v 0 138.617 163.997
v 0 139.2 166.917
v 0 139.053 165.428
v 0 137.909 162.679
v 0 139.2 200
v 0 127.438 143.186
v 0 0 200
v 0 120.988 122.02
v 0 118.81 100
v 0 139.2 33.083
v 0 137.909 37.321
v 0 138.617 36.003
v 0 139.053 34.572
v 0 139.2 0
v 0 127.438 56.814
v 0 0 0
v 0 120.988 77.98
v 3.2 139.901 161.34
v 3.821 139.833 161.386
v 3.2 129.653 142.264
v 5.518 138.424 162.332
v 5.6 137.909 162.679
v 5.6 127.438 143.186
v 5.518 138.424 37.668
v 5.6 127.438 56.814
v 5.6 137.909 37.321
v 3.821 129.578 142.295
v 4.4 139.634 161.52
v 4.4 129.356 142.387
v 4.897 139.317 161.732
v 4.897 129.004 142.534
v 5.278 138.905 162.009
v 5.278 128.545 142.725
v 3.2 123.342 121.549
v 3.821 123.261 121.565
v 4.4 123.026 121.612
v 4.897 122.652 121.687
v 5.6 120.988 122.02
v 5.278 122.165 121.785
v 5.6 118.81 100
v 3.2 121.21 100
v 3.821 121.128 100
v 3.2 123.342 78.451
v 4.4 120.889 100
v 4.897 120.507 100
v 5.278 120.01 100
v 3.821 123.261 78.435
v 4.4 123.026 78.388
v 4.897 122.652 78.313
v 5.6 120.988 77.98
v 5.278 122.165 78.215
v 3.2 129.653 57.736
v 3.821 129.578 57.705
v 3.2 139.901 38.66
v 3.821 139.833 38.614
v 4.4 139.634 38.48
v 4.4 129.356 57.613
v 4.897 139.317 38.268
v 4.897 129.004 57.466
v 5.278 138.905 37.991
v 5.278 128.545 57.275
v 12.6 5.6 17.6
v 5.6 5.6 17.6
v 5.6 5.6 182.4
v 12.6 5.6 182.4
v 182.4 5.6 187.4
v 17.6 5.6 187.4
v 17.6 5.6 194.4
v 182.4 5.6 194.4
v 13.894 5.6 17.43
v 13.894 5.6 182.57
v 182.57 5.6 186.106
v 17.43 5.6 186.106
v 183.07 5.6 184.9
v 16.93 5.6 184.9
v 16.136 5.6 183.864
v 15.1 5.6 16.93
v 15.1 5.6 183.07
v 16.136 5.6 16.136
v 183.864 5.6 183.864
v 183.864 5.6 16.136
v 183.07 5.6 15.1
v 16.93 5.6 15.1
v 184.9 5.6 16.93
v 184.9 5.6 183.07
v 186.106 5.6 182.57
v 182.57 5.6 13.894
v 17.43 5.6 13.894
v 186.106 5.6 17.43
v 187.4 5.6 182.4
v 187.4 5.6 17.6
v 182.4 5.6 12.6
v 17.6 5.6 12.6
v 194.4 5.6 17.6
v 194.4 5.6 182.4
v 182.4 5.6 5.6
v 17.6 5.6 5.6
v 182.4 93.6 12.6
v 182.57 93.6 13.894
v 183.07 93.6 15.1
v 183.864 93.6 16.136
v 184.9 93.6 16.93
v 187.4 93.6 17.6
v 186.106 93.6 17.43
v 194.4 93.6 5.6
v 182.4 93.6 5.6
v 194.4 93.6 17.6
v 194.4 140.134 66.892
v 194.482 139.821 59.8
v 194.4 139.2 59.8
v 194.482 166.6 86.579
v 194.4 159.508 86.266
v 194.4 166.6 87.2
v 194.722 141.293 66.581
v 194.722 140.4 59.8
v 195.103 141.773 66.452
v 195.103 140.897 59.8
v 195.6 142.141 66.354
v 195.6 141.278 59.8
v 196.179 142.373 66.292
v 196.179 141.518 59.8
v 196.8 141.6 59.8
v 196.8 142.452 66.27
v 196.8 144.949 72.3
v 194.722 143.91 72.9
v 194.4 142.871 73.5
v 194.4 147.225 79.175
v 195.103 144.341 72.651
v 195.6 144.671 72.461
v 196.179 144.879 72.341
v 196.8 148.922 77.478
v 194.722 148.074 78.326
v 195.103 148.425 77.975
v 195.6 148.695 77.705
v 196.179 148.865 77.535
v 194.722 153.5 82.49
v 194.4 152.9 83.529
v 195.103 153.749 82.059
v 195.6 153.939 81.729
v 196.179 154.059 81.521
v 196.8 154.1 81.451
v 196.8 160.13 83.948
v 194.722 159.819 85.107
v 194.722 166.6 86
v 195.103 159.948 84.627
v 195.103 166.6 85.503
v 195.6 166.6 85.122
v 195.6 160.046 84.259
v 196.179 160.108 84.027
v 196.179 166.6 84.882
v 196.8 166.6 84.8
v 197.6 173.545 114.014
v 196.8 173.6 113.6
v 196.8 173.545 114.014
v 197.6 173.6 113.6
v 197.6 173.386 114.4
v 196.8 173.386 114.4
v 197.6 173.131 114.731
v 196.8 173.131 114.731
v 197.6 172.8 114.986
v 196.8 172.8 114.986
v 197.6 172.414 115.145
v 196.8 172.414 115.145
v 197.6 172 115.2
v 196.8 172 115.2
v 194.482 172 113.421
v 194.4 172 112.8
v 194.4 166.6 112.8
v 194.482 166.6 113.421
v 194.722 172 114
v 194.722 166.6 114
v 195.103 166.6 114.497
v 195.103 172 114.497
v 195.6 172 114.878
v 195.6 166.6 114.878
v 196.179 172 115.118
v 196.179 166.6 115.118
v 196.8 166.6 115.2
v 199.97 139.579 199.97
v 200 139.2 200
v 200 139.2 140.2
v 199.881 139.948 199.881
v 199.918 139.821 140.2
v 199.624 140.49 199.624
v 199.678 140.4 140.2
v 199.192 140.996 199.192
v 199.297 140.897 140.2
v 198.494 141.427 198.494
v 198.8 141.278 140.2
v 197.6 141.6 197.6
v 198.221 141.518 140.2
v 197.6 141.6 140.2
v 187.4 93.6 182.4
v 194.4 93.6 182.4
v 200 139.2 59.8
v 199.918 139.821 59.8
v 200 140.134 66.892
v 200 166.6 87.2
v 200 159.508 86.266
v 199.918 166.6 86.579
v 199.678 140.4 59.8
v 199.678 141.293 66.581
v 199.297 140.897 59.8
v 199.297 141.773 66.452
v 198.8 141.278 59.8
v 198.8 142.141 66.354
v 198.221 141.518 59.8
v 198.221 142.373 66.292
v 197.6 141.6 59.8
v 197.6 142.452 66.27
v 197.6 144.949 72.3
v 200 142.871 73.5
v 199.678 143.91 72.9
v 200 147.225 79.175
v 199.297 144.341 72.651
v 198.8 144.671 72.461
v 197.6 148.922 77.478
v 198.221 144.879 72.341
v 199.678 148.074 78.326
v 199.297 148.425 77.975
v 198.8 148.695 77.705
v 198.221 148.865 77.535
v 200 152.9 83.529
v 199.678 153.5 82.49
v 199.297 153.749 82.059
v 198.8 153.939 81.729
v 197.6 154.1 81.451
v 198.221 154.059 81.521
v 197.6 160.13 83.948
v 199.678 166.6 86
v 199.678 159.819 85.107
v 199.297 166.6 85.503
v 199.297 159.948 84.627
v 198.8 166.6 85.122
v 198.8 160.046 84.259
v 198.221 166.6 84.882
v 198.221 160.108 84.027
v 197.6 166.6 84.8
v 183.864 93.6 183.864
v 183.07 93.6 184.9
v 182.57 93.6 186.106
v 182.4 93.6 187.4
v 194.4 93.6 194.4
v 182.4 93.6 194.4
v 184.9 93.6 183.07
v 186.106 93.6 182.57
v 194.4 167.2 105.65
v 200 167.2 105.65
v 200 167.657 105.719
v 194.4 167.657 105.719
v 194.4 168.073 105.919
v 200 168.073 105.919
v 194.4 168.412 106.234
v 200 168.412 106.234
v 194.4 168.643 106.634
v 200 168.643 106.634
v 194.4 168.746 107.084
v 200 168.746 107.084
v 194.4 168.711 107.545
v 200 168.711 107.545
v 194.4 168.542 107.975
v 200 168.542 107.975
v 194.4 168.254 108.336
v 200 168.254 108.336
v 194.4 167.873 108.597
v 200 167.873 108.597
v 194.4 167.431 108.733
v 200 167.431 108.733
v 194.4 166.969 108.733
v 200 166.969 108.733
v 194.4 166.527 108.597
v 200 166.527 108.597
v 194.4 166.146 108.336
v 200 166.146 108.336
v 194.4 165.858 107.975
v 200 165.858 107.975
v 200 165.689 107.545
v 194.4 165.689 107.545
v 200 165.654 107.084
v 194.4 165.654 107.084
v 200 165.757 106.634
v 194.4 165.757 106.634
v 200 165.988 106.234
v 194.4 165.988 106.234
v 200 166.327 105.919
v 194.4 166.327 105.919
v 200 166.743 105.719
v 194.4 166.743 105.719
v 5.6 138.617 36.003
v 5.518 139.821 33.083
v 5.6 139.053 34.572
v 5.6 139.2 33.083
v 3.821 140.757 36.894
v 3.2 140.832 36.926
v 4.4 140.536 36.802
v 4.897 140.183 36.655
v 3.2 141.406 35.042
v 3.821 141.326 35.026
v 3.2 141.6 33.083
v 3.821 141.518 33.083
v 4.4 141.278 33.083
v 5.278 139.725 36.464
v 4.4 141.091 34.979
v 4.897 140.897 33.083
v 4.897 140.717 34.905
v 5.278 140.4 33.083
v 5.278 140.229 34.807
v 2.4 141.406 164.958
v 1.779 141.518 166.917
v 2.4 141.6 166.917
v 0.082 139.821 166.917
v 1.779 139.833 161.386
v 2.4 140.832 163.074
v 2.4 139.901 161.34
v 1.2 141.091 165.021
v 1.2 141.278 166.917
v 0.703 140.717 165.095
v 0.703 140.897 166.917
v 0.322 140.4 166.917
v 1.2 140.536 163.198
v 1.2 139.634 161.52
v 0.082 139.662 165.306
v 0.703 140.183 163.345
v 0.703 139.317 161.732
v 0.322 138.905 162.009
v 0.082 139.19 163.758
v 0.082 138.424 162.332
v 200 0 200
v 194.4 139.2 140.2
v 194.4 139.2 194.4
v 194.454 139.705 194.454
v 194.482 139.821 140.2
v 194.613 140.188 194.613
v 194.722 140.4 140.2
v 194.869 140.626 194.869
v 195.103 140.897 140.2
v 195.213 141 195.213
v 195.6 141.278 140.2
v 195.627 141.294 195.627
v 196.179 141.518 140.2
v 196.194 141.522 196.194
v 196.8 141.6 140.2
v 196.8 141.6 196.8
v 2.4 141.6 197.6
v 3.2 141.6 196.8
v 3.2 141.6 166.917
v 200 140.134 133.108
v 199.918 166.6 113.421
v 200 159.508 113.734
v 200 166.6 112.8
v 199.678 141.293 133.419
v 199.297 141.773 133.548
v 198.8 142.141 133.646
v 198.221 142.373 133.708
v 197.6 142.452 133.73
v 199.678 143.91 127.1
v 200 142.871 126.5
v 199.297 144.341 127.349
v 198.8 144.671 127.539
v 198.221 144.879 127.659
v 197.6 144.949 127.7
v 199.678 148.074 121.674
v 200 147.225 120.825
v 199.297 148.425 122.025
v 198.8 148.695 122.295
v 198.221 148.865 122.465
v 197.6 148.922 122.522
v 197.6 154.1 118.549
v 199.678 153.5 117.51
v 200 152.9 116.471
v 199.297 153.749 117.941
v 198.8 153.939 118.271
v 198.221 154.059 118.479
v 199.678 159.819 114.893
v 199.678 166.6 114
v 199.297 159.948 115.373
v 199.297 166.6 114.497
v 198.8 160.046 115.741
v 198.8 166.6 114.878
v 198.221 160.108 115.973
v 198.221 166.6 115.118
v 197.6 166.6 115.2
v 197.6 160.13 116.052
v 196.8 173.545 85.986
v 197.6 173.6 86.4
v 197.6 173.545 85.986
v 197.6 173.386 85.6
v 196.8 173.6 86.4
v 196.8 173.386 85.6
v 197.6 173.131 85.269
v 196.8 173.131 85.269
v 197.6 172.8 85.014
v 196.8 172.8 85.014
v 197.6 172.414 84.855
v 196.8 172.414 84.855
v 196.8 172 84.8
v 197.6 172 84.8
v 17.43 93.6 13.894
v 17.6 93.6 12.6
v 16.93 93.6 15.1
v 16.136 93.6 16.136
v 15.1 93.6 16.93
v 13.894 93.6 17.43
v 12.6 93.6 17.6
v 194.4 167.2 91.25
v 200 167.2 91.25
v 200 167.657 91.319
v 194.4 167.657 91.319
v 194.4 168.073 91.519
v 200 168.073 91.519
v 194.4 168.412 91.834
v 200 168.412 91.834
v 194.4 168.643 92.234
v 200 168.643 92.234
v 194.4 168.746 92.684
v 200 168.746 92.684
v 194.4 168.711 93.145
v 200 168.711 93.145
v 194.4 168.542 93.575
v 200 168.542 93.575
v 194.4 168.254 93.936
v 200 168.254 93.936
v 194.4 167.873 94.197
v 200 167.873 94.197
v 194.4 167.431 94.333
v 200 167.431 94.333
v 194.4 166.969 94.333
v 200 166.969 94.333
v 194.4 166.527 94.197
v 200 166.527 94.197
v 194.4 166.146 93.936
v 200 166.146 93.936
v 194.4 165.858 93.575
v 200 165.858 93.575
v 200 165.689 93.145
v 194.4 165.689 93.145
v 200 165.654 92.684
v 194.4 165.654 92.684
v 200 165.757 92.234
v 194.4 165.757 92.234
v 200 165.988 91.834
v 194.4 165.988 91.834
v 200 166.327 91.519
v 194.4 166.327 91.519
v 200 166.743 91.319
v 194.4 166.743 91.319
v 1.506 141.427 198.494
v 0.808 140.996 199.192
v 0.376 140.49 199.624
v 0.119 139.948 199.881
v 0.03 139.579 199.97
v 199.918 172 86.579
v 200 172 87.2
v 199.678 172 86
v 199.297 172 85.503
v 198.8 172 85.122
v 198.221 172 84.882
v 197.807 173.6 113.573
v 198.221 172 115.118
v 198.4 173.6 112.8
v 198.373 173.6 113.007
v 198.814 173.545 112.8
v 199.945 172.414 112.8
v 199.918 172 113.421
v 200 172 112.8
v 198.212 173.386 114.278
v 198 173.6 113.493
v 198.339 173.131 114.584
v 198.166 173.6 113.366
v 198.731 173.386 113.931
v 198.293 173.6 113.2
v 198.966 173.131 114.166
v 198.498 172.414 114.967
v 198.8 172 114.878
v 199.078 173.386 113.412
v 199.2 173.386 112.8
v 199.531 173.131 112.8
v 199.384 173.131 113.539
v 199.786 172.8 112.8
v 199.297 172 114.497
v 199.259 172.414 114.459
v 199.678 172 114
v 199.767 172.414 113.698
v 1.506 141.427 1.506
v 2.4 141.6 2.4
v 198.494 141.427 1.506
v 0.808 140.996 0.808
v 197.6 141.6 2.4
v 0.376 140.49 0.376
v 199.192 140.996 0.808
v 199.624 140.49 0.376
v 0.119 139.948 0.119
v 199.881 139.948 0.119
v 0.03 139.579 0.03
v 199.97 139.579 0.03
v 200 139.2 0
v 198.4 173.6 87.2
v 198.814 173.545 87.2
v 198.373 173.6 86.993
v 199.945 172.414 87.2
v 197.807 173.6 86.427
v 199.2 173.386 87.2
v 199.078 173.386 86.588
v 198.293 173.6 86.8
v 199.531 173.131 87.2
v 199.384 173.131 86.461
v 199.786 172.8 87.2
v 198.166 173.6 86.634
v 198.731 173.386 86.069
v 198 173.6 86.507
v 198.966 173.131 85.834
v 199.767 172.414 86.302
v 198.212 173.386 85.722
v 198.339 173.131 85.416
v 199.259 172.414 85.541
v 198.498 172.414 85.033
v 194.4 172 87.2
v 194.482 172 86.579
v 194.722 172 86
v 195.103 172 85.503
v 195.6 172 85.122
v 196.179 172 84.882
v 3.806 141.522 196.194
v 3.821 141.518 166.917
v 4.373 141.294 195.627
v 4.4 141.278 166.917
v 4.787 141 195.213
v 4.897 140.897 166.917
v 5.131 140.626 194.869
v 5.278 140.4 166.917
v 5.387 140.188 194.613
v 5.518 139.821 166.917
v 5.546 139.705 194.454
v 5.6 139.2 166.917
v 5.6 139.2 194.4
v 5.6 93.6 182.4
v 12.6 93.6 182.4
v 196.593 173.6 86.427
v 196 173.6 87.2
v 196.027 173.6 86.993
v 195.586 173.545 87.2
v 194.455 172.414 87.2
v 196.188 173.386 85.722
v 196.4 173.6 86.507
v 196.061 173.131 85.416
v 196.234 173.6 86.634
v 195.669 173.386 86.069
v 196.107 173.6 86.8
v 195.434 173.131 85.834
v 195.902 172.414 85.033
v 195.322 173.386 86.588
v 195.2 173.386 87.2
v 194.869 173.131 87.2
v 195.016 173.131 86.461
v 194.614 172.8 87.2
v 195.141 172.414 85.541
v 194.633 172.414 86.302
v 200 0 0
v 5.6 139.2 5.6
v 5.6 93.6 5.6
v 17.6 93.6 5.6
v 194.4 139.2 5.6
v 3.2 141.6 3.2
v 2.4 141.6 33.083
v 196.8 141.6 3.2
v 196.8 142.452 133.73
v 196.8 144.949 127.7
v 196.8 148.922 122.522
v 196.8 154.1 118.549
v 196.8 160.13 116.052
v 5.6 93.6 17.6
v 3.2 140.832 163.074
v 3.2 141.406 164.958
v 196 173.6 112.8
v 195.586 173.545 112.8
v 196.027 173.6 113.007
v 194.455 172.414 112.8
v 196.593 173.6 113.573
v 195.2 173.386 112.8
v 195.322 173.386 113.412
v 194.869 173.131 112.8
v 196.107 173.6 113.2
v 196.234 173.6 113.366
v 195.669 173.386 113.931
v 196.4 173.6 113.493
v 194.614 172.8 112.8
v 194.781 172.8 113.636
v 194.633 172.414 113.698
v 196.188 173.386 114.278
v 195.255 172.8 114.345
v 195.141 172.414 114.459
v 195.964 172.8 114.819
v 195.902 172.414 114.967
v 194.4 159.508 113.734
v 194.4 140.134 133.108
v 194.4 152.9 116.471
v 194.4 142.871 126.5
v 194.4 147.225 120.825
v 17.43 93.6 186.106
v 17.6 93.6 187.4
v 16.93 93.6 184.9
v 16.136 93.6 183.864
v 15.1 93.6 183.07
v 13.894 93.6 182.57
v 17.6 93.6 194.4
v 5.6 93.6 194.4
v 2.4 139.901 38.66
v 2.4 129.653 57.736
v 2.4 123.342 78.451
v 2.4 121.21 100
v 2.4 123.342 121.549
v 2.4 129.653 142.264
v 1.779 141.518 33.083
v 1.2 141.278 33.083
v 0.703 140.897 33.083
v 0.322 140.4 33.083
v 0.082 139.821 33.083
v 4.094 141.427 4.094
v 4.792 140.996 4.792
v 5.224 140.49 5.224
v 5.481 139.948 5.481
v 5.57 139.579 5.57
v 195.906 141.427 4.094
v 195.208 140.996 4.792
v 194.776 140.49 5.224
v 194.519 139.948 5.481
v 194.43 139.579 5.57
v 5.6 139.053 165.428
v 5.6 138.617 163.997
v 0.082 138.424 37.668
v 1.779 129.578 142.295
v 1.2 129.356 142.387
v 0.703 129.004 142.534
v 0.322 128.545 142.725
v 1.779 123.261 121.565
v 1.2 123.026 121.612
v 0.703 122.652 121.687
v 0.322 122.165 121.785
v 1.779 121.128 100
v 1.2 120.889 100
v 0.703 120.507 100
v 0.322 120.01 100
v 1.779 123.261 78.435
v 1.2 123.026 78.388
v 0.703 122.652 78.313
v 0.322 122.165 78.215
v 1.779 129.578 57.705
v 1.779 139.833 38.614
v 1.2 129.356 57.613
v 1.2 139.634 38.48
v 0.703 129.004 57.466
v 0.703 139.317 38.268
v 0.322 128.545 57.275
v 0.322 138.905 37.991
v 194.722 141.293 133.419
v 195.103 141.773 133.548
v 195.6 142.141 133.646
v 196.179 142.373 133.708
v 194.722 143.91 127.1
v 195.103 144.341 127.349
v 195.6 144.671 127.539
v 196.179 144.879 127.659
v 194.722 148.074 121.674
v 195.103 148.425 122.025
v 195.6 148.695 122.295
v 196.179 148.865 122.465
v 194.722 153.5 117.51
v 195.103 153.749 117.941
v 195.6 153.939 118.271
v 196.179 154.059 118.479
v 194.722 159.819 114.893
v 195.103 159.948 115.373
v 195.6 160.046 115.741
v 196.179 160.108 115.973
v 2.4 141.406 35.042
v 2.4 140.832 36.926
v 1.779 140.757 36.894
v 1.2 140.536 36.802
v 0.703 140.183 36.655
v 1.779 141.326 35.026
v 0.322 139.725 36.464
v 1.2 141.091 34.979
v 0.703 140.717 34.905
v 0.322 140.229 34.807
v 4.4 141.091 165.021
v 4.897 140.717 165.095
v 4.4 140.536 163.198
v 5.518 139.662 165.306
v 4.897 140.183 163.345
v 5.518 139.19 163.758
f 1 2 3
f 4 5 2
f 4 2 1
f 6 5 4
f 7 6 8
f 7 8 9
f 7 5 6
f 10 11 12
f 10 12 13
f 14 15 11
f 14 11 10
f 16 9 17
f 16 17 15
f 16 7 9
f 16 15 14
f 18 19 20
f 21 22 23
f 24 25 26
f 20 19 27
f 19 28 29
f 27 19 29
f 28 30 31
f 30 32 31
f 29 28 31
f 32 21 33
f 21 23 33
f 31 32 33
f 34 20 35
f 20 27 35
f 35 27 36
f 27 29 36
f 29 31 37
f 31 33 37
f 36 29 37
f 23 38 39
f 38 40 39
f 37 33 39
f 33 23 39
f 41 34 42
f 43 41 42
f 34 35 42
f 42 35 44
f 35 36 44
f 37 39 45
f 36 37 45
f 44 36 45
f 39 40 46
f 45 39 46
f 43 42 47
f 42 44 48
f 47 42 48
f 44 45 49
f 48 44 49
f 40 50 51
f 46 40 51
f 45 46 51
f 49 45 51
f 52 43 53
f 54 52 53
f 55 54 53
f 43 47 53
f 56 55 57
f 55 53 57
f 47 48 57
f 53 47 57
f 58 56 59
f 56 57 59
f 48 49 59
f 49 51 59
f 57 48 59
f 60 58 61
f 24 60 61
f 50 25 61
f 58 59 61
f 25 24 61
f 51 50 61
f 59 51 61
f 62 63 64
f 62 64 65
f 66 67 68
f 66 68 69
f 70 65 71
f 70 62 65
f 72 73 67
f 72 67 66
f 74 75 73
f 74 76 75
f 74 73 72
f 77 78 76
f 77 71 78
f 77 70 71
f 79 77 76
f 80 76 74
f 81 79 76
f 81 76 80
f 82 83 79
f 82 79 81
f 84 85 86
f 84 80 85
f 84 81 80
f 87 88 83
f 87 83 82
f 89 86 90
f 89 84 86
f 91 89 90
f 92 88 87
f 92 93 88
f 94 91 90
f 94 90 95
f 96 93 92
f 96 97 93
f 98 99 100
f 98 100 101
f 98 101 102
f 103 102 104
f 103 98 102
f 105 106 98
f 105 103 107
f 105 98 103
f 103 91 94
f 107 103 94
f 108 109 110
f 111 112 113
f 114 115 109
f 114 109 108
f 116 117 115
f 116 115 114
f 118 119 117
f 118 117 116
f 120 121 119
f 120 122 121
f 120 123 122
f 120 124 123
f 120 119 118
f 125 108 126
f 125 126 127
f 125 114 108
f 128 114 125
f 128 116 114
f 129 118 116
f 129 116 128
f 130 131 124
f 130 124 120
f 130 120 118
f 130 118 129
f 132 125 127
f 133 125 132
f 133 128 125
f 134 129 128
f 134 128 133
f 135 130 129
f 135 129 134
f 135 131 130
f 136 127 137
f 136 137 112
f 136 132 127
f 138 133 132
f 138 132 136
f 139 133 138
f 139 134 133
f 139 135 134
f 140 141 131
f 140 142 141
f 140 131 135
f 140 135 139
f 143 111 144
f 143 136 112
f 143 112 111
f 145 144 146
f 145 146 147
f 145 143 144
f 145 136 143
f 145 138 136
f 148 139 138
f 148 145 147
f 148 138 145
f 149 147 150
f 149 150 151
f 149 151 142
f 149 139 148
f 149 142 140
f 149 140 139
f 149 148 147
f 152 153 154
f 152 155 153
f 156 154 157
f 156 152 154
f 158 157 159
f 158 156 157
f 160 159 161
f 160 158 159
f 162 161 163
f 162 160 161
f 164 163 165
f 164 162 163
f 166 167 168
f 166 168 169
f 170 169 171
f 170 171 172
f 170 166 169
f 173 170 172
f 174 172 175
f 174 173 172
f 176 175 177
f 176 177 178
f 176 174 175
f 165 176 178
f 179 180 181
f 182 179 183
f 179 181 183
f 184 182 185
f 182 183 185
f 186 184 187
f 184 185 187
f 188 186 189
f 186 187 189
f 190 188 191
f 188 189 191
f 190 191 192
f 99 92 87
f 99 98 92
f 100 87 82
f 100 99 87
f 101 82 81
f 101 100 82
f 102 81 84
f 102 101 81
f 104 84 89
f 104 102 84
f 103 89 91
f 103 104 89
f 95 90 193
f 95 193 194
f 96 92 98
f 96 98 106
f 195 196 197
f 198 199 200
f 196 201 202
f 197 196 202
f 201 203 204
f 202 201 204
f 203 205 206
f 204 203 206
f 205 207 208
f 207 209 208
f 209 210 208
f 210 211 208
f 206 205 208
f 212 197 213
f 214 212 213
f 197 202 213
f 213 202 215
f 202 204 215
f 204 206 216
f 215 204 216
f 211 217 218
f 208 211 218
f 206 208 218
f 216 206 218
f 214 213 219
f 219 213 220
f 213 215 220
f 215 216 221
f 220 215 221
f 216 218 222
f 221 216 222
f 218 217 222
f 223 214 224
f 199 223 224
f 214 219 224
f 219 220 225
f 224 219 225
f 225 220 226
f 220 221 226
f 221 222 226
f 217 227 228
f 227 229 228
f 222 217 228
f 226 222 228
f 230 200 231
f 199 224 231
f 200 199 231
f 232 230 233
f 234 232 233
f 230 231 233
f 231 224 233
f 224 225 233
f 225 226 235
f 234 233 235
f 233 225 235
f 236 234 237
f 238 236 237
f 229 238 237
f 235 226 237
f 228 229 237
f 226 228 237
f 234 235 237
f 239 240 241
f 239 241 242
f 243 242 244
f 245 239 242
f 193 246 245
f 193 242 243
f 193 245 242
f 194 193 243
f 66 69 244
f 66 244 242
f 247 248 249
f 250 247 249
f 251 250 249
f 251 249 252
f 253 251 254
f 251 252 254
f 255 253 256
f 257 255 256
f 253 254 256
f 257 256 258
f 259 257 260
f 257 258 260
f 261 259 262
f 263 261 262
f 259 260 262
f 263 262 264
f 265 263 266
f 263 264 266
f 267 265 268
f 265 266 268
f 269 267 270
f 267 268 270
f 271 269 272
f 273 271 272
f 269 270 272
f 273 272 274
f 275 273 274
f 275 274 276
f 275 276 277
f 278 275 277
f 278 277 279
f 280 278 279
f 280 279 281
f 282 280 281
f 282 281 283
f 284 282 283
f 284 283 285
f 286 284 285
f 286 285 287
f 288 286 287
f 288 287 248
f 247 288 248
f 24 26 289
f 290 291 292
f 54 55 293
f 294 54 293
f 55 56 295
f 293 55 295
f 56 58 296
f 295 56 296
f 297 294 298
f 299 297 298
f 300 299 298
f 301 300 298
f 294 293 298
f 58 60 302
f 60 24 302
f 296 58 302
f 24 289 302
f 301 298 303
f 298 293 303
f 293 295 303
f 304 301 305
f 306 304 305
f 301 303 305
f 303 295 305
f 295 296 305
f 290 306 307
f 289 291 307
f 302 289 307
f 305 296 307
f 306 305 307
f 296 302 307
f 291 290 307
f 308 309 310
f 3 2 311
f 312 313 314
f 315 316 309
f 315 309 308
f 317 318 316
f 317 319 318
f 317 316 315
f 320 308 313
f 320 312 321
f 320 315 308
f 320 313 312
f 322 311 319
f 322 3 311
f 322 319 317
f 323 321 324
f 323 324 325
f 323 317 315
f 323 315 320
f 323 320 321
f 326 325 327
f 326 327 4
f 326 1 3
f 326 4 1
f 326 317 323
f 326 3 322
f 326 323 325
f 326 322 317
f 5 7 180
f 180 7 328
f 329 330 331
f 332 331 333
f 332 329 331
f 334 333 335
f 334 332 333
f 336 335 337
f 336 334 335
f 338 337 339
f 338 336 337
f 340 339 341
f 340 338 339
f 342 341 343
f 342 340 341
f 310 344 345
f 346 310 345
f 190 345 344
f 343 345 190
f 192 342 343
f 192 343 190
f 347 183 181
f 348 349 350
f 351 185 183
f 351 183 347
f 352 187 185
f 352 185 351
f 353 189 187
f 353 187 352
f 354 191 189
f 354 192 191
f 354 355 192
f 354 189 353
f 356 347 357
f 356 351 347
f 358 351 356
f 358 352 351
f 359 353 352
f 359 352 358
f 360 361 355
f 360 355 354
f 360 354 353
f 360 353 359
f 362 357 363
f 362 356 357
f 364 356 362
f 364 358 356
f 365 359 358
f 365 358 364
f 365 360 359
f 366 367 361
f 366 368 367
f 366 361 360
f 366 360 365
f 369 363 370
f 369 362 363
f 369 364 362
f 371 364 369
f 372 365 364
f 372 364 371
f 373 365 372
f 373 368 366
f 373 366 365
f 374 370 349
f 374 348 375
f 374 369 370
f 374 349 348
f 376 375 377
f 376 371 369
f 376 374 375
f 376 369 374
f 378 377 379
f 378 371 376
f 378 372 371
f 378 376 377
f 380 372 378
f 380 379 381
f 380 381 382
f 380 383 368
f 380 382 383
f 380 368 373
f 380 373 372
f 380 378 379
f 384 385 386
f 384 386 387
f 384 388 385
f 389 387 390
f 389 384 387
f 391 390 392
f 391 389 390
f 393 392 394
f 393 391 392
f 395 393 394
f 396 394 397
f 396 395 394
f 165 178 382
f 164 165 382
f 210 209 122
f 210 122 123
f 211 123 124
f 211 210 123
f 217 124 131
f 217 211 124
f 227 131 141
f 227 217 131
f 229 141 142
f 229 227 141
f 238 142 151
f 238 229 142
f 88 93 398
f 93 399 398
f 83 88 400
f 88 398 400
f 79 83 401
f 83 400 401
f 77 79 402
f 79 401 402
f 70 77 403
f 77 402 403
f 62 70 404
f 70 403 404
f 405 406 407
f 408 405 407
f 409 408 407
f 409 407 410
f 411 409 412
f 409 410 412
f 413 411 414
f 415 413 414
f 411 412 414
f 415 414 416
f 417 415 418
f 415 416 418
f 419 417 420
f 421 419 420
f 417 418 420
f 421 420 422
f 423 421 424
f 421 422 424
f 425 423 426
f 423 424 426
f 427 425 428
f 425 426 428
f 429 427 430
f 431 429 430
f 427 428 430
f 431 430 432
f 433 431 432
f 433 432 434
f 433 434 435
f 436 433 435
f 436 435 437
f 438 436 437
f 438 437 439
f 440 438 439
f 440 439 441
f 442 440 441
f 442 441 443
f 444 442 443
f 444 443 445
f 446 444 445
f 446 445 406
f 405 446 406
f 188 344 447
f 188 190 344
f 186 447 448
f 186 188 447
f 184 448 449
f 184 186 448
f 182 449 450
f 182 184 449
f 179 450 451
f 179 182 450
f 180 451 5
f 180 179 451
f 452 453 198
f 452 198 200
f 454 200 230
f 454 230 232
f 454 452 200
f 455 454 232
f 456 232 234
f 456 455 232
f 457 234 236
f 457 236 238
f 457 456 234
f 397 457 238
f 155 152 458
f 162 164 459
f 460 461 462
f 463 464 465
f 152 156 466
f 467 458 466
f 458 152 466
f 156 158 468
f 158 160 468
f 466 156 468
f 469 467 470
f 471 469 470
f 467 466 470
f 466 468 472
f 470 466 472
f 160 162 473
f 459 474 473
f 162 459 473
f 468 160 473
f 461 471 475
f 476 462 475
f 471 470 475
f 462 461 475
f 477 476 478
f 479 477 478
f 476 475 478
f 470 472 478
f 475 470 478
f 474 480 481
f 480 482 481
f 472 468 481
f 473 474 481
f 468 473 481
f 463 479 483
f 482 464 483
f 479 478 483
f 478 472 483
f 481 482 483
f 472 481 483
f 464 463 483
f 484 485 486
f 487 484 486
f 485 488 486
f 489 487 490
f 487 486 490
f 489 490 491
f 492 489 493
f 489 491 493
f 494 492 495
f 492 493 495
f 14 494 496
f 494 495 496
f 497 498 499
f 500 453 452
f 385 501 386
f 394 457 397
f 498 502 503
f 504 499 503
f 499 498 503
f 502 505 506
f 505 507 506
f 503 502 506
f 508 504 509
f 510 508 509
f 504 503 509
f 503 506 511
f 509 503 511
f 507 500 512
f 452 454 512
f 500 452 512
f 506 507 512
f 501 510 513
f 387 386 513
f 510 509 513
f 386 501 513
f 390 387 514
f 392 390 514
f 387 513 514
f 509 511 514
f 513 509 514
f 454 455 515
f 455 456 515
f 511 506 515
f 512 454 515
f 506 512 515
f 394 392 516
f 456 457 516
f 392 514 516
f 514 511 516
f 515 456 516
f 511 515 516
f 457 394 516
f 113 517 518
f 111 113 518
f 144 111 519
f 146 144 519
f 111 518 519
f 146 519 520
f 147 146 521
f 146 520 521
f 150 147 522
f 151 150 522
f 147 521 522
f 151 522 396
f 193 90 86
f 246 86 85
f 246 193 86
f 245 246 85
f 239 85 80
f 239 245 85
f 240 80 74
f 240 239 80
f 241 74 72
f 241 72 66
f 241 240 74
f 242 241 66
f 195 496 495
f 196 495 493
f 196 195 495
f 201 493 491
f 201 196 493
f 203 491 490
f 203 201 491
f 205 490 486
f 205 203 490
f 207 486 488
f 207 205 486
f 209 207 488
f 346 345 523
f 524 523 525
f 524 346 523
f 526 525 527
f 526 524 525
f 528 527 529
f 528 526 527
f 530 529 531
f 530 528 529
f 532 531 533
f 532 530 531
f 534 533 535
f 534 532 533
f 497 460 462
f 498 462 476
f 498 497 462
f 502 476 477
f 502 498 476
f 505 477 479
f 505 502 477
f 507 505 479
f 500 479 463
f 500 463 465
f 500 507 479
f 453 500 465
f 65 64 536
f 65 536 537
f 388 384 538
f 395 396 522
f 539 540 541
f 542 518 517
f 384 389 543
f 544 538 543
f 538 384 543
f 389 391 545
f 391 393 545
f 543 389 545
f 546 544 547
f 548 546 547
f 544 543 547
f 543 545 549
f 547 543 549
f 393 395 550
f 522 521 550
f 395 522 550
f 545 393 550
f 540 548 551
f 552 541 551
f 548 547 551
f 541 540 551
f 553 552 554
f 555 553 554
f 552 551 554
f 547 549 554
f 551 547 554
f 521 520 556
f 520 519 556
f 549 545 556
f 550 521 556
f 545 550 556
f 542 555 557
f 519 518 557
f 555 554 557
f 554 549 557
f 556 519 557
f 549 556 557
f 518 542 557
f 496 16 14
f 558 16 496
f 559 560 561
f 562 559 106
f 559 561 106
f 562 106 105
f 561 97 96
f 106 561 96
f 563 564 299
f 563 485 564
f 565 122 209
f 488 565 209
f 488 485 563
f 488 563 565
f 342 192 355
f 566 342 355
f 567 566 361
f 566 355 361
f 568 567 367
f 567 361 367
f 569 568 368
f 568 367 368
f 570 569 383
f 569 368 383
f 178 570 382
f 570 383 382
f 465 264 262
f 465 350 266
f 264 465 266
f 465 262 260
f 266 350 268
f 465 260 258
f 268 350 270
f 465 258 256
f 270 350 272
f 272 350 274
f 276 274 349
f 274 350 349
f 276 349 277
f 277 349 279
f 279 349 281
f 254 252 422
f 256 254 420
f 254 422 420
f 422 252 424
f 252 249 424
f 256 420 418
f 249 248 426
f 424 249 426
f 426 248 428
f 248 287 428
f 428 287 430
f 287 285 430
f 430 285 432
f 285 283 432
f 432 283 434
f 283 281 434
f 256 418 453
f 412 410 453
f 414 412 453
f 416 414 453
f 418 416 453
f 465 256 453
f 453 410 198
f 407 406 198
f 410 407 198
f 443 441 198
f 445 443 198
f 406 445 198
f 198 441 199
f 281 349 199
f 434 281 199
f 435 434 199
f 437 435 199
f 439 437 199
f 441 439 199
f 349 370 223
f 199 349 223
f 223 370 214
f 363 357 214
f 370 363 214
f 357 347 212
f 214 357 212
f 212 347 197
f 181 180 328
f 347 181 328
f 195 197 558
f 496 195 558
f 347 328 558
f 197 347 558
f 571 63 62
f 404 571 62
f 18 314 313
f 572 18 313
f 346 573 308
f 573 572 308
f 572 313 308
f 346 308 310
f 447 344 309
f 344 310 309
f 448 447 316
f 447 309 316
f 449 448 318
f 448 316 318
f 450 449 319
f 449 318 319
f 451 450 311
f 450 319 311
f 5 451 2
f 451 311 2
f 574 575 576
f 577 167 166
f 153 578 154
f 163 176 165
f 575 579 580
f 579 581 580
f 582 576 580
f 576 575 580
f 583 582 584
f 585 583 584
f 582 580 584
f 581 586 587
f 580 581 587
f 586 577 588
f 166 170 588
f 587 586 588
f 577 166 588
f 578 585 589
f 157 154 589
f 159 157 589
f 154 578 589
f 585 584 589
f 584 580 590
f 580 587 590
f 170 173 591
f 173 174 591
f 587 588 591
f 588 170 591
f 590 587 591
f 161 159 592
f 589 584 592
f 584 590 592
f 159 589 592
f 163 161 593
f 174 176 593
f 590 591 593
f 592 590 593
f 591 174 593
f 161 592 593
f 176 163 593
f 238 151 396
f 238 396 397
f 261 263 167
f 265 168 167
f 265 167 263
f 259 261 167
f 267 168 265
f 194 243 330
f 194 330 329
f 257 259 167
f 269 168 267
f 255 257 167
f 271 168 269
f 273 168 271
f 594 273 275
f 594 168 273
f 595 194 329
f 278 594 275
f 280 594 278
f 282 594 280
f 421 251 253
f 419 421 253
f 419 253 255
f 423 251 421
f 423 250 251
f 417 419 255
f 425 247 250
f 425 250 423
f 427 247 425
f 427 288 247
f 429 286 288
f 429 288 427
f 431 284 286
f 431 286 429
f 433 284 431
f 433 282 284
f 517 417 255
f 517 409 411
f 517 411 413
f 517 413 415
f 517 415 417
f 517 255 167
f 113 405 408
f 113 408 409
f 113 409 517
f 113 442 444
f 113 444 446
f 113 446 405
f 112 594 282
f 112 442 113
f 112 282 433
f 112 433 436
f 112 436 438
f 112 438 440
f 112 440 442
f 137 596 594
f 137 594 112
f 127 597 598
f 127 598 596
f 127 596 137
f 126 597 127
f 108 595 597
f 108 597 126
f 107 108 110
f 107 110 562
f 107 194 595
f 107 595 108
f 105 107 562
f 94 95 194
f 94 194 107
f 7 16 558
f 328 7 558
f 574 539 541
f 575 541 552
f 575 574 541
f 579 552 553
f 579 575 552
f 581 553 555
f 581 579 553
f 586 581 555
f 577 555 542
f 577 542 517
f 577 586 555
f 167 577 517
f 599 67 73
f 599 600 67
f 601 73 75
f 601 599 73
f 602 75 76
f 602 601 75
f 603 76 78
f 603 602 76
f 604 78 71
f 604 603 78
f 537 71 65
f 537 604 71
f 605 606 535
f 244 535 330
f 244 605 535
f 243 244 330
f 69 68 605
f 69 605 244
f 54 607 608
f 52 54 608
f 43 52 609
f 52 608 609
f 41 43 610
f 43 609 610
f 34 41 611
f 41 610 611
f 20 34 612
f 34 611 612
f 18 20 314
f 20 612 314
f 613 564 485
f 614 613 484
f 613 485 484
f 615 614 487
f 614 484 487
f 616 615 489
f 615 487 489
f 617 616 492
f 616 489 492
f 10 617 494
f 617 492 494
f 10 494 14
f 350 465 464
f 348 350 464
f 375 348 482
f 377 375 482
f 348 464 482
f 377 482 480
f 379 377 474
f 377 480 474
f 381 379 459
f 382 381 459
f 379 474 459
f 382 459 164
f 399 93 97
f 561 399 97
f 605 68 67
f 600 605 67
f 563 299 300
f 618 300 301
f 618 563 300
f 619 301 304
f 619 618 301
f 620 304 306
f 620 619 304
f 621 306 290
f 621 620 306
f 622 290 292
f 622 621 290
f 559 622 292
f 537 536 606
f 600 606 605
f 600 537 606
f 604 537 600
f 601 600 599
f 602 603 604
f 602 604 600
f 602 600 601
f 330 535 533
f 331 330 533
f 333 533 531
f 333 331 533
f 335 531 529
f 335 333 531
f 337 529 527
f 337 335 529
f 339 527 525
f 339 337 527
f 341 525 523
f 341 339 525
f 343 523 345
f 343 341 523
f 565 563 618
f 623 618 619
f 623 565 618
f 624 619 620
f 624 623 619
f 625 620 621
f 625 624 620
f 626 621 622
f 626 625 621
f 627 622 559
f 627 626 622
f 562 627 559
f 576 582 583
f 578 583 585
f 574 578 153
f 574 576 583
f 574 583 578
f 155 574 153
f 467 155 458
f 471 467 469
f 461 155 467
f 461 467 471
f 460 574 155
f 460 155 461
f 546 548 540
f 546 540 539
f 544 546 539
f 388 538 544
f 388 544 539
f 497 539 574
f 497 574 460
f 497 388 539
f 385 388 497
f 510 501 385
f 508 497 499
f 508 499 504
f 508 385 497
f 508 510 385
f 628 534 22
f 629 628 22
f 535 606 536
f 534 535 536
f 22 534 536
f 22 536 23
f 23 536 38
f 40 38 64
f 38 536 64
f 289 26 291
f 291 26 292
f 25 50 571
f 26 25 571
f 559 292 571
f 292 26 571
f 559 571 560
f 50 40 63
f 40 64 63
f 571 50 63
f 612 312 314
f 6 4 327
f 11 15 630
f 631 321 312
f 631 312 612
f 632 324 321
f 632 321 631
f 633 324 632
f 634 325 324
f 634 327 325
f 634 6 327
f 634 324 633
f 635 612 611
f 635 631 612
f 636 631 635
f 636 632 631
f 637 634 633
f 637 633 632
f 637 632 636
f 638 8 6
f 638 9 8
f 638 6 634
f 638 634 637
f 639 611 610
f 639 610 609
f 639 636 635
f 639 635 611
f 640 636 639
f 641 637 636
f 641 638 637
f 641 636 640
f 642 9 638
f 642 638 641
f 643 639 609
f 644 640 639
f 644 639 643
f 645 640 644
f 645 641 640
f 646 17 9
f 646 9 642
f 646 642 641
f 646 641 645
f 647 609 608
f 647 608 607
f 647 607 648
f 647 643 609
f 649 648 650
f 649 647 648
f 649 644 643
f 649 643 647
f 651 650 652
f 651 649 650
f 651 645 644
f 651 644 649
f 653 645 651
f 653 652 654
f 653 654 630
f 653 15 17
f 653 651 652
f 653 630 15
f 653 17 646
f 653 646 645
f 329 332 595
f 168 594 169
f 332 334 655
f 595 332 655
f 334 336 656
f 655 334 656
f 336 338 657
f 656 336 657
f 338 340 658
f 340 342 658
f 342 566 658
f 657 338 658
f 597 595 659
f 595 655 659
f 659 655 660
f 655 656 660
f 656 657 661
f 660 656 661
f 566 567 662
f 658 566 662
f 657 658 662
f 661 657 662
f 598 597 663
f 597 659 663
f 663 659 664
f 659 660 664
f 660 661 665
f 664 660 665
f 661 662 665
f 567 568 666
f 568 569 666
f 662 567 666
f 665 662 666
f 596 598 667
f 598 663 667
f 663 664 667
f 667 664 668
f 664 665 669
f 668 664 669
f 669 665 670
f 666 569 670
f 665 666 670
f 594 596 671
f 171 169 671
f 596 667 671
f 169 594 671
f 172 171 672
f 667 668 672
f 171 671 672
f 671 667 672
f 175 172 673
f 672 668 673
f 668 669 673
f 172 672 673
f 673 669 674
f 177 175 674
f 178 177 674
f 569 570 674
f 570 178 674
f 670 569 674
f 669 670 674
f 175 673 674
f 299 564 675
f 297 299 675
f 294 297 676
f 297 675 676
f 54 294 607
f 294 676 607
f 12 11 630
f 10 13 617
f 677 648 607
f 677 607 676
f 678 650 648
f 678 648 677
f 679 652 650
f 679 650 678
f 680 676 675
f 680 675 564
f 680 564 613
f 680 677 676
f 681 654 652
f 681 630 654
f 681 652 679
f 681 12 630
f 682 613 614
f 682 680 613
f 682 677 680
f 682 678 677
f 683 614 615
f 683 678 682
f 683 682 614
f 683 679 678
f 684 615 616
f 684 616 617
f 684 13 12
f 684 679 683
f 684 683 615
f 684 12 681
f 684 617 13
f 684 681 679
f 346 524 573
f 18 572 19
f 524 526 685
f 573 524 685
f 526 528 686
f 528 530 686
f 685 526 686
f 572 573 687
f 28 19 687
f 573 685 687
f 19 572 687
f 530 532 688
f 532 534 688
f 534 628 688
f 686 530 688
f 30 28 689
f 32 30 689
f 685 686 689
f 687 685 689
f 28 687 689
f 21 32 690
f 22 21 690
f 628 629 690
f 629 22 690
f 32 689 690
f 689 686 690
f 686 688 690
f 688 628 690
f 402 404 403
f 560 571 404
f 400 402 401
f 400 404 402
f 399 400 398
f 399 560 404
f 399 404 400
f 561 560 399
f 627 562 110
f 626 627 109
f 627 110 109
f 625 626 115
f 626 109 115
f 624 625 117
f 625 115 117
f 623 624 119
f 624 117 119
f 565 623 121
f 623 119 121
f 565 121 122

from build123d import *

# Parameters (mm, degrees)
SKETCH1_W           = 200
SKETCH1_H           = 200
BOSS_EXTRUDE1_DEPTH = 5.6
SKETCH2_W           = 200
SKETCH2_H           = 200
SKETCH2_W_2         = 188.8
SKETCH2_H_2         = 188.8
BOSS_EXTRUDE2_DEPTH = 136
SKETCH3_W           = 5.6
SKETCH3_H           = 30.4
BOSS_EXTRUDE3_DEPTH = 32
FILLET1_R           = 25
SKETCH4_R           = 110
CUT_EXTRUDE1_DEPTH  = 12
FILLET3_R           = 10
FILLET2_R           = 2.4
SKETCH5_W           = 12
SKETCH5_H           = 12
BOSS_EXTRUDE4_DEPTH = 88
FILLET4_R           = 5
SKETCH6_R           = 1.55
CUT_EXTRUDE2_DEPTH  = 332.868889774
FILLET5_R           = 1.6


with BuildPart() as part:
    # Sketch1 → Boss-Extrude1 (new body)
    with BuildSketch(Plane(origin=(0, 0, 0), x_dir=(1, 0, 0), z_dir=(0, 1, 0))):
        with Locations((100, -100)):
            Rectangle(SKETCH1_W, SKETCH1_H)
    extrude(amount=BOSS_EXTRUDE1_DEPTH)

    # Sketch2 → Boss-Extrude2 (add)
    with BuildSketch(Plane(origin=(0, 5.6, 0), x_dir=(1, 0, 0), z_dir=(0, 1, 0))):
        with Locations((100, -100)):
            Rectangle(SKETCH2_W, SKETCH2_H)
        with Locations((100, -100)):
            Rectangle(SKETCH2_W_2, SKETCH2_H_2, mode=Mode.SUBTRACT)
    extrude(amount=BOSS_EXTRUDE2_DEPTH)

    # Sketch3 → Boss-Extrude3 (add)
    with BuildSketch(Plane(origin=(0, 141.6, 0), x_dir=(1, 0, 0), z_dir=(0, 1, 0))):
        with Locations((197.2, -100)):
            Rectangle(SKETCH3_W, SKETCH3_H)
    extrude(amount=BOSS_EXTRUDE3_DEPTH)

    # Fillet1
    fillet1_edges = [part.edges().sort_by_distance(p)[0] for p in [
        (197.2, 141.6, 115.2),
        (197.2, 141.6, 84.8),
    ]]
    fillet(fillet1_edges, radius=FILLET1_R)

    # Sketch4 → Cut-Extrude1 (cut)
    with BuildSketch(Plane.ZY):
        with Locations((100, 231.210075879)):
            Circle(SKETCH4_R)
    extrude(amount=-CUT_EXTRUDE1_DEPTH, mode=Mode.SUBTRACT)

    # Fillet3
    fillet3_edges = [part.edges().sort_by_distance(p)[0] for p in [
        (2.8, 141.6, 163.796820462),
        (2.8, 141.6, 36.203179538),
    ]]
    fillet(fillet3_edges, radius=FILLET3_R)

    # Fillet2
    fillet2_edges = [part.edges().sort_by_distance(p)[0] for p in [
        (0, 141.6, 16.541694665),
        (100, 141.6, 200),
        (200, 141.6, 170.1),
        (100, 141.6, 0),
        (100, 141.6, 194.4),
        (194.4, 141.6, 167.3),
        (100, 141.6, 5.6),
        (5.6, 141.6, 19.341694665),
        (194.4, 170.1, 84.8),
        (194.4, 170.1, 115.2),
        (200, 170.1, 115.2),
        (200, 170.1, 84.8),
        (200, 141.6, 29.9),
        (194.4, 141.6, 32.7),
        (200, 148.92233047, 122.52233047),
        (194.4, 148.92233047, 122.52233047),
        (194.4, 148.92233047, 77.47766953),
        (200, 148.92233047, 77.47766953),
        (5.6, 141.6, 180.658305335),
        (0, 141.6, 183.458305335),
        (0, 121.210075879, 100),
        (0, 141.16578268, 35.99814519),
        (0, 141.16578268, 164.00185481),
        (5.6, 121.210075879, 100),
        (5.6, 141.16578268, 35.99814519),
        (5.6, 141.16578268, 164.00185481),
    ]]
    fillet(fillet2_edges, radius=FILLET2_R)

    # Sketch5 → Boss-Extrude4 (add)
    with BuildSketch(Plane(origin=(0, 5.6, 0), x_dir=(1, 0, 0), z_dir=(0, 1, 0))):
        with Locations((188.4, -11.6)):
            Rectangle(SKETCH5_W, SKETCH5_H)
        with Locations((188.4, -188.4)):
            Rectangle(SKETCH5_W, SKETCH5_H)
        with Locations((11.6, -11.6)):
            Rectangle(SKETCH5_W, SKETCH5_H)
        with Locations((11.6, -188.4)):
            Rectangle(SKETCH5_W, SKETCH5_H)
    extrude(amount=BOSS_EXTRUDE4_DEPTH)

    # Fillet4
    fillet4_edges = [part.edges().sort_by_distance(p)[0] for p in [
        (182.4, 49.6, 17.6),
        (182.4, 49.6, 182.4),
        (17.6, 49.6, 17.6),
        (17.6, 49.6, 182.4),
    ]]
    fillet(fillet4_edges, radius=FILLET4_R)

    # Sketch6 → Cut-Extrude2 (cut, through all)
    with BuildSketch(Plane(origin=(200, 0, 0), x_dir=(0, 0, -1), z_dir=(1, 0, 0))):
        with Locations((-107.2, 167.2)):
            Circle(SKETCH6_R)
        with Locations((-92.8, 167.2)):
            Circle(SKETCH6_R)
    extrude(amount=-CUT_EXTRUDE2_DEPTH, mode=Mode.SUBTRACT)

    # Fillet5
    fillet5_edges = [part.edges().sort_by_distance(p)[0] for p in [
        (197.2, 173.6, 115.2),
        (194.4, 173.6, 100),
        (200, 173.6, 100),
        (197.2, 173.6, 84.8),
        (195.102943725, 173.6, 85.502943725),
        (199.297056275, 173.6, 85.502943725),
        (199.297056275, 173.6, 114.497056275),
        (195.102943725, 173.6, 114.497056275),
    ]]
    fillet(fillet5_edges, radius=FILLET5_R)


solid = part.part
